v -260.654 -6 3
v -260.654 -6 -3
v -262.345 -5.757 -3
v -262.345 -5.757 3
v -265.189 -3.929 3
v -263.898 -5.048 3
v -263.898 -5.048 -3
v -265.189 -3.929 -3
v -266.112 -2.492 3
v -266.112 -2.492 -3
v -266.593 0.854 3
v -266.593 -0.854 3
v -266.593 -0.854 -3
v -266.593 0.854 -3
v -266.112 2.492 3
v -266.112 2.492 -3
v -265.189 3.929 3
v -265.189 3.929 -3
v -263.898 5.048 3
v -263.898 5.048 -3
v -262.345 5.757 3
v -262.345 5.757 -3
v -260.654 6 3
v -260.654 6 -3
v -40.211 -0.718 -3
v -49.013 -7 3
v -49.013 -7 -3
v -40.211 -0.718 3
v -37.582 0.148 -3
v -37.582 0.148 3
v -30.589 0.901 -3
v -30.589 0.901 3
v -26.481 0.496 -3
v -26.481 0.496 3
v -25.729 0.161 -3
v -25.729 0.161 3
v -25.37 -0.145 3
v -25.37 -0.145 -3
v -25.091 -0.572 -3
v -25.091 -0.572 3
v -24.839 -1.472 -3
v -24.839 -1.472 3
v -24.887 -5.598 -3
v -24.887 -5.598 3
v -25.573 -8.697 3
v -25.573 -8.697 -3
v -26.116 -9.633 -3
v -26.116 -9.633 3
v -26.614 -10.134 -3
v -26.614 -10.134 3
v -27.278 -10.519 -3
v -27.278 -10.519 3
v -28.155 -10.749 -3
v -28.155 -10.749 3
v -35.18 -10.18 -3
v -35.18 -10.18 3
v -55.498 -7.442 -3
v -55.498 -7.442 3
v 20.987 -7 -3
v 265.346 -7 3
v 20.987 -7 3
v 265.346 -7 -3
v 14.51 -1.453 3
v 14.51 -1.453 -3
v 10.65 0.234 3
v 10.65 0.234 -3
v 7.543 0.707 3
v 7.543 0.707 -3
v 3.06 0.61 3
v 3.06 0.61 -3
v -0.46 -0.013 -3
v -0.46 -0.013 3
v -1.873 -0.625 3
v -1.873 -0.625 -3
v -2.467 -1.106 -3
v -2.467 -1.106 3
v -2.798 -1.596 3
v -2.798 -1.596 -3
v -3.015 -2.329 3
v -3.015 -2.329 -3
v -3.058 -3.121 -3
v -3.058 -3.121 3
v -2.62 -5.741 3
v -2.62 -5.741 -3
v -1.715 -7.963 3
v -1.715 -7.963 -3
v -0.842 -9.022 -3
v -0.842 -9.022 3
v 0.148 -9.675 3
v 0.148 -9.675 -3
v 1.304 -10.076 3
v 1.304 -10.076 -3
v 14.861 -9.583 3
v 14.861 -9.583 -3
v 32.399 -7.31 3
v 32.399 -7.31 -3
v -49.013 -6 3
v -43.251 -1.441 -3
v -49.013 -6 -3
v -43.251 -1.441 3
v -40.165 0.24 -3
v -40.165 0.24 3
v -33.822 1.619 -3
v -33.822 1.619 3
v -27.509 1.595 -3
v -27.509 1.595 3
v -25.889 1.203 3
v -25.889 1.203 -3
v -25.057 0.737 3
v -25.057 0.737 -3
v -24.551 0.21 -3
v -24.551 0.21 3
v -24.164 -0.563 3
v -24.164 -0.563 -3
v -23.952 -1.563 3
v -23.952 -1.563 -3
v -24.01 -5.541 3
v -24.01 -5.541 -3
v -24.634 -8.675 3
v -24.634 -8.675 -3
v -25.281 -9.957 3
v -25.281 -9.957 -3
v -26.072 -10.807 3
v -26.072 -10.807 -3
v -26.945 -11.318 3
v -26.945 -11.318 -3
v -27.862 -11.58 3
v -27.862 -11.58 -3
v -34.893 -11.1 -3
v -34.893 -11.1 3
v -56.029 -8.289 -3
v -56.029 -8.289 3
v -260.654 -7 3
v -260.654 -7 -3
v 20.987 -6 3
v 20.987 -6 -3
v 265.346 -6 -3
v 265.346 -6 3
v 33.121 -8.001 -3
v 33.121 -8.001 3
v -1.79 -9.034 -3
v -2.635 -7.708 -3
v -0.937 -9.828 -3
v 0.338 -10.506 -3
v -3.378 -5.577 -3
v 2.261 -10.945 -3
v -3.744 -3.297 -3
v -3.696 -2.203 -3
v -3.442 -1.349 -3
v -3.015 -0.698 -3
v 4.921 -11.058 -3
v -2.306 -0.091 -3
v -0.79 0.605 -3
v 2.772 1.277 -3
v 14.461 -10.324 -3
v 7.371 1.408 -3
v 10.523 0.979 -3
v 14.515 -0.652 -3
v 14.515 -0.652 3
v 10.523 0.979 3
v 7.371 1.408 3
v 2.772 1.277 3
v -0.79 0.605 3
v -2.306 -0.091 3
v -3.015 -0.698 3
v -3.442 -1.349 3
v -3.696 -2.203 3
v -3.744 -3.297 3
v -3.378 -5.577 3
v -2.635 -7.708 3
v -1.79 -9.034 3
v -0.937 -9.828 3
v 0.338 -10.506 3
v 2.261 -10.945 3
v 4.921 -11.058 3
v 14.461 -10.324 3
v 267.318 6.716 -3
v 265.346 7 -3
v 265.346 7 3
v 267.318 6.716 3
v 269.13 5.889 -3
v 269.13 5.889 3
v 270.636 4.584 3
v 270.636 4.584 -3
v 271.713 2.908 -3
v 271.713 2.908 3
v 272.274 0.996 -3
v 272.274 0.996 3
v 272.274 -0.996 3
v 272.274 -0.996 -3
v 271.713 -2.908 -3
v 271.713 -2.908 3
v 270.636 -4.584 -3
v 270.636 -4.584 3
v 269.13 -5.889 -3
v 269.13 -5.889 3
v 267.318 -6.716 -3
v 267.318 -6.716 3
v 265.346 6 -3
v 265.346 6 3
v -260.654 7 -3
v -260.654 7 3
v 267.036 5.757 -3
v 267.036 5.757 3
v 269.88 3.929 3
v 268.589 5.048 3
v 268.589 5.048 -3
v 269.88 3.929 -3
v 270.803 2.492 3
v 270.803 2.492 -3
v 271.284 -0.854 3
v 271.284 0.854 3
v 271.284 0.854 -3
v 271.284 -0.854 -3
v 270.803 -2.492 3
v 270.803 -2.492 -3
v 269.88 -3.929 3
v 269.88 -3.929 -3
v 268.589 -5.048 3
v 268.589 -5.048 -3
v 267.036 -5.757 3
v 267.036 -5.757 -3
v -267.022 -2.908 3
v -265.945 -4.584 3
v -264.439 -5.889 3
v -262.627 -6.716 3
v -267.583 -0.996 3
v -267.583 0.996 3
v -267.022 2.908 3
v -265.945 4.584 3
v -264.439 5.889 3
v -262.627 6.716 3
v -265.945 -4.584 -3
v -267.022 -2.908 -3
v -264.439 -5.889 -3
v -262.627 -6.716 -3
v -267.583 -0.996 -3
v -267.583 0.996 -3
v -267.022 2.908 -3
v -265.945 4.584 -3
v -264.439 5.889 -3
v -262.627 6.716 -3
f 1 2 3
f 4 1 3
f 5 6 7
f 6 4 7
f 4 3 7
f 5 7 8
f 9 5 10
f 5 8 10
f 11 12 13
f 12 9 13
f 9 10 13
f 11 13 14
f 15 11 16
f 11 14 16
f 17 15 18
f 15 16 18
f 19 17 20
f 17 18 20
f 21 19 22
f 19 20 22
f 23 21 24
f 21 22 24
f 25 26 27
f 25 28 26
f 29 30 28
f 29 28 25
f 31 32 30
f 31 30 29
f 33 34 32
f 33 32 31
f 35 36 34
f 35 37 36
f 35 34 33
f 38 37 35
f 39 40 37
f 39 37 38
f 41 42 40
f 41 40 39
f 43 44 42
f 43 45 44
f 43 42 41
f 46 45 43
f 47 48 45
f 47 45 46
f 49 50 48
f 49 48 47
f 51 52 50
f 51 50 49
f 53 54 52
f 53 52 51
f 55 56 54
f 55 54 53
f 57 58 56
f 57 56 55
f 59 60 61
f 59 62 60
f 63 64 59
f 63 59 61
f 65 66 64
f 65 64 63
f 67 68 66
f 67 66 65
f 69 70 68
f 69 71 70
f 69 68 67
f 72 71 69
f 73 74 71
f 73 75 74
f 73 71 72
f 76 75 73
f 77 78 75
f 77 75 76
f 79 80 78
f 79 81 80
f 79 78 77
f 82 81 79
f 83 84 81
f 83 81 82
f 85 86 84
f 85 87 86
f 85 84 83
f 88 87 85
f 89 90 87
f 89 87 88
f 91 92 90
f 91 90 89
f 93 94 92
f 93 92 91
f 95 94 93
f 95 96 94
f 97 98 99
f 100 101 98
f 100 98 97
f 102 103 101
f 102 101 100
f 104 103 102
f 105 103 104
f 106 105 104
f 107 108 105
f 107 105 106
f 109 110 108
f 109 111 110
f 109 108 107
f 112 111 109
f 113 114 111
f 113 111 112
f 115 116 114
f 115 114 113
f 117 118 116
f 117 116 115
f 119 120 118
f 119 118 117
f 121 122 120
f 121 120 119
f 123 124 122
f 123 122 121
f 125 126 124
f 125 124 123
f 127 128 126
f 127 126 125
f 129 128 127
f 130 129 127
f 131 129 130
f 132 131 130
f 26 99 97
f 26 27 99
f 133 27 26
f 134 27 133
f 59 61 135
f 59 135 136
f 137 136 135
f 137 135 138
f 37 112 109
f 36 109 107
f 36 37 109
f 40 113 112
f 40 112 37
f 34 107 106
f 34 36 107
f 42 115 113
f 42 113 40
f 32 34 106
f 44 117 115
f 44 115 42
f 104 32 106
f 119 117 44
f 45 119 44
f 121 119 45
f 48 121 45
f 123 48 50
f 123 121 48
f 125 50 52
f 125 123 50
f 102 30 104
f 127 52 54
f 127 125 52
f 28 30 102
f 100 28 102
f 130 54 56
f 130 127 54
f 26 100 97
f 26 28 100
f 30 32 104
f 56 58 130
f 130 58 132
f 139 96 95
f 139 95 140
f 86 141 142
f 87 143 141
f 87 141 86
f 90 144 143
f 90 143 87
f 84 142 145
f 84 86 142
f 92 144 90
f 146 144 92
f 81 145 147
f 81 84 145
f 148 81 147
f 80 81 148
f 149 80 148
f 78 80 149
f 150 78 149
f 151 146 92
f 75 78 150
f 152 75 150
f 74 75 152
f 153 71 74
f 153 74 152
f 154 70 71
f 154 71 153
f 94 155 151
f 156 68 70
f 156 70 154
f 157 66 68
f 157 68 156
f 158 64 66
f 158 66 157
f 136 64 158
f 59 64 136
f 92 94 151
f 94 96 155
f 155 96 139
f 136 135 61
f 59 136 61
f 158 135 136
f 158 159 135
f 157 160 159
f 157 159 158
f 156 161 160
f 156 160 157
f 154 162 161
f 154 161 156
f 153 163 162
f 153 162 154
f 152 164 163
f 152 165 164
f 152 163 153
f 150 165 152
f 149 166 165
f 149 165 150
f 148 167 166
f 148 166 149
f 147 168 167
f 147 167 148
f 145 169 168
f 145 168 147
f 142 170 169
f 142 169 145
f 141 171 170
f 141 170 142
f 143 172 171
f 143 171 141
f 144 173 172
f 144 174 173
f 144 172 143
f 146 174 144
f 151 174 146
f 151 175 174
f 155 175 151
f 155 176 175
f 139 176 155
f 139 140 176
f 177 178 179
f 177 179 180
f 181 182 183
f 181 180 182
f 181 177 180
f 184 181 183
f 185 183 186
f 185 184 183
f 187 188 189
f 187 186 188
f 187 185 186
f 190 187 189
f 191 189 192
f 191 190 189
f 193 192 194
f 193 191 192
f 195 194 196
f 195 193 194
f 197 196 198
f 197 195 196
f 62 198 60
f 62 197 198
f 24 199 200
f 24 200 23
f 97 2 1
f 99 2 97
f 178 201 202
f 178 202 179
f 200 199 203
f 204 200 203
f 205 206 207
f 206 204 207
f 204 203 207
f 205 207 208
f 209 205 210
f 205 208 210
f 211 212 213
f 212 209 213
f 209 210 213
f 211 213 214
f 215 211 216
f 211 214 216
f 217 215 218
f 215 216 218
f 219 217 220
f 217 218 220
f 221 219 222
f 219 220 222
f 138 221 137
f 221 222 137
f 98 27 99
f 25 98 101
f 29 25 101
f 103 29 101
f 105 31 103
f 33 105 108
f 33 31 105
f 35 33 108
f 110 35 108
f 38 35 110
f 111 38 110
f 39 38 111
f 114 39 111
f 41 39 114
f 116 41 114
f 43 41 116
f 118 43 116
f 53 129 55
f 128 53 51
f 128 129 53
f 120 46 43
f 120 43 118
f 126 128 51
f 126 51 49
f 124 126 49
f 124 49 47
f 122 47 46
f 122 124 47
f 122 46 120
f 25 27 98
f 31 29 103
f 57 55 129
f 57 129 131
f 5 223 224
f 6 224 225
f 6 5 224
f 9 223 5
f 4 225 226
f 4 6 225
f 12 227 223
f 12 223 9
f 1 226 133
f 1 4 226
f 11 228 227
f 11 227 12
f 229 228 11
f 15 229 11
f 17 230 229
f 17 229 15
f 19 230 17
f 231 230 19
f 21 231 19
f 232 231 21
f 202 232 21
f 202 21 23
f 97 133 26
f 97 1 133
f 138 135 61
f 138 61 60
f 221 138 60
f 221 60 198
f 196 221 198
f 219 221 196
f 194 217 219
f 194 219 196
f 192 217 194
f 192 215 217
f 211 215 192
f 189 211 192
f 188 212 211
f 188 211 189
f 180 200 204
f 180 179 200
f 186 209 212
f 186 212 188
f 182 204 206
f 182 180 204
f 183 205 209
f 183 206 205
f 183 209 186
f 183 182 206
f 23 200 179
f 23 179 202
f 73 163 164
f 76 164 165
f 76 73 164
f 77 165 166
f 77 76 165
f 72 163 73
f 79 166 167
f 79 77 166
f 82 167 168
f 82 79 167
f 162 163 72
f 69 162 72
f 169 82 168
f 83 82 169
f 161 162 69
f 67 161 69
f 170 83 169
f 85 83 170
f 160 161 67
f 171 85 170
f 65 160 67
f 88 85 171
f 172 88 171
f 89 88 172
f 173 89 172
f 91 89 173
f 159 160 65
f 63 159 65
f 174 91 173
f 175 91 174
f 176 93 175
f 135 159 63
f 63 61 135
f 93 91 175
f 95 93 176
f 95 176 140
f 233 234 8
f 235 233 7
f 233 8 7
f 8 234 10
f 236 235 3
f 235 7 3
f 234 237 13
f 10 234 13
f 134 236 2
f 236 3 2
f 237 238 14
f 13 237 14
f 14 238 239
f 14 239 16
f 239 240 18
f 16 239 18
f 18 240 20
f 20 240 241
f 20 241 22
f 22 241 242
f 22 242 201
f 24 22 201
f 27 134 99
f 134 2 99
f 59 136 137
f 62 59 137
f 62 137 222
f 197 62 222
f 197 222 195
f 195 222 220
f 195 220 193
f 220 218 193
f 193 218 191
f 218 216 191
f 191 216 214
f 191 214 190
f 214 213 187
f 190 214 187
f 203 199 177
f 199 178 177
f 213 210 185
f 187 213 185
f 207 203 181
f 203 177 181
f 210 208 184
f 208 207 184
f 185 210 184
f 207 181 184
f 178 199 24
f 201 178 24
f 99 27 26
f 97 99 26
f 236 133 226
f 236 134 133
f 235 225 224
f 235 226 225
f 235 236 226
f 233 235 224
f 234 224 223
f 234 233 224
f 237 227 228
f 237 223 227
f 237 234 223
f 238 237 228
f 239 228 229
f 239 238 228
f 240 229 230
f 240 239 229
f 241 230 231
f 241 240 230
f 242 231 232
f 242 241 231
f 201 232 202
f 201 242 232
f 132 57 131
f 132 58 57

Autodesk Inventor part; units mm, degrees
ref_plane "YZ Plane" through (0, 0, 0) normal (1, 0, 0) x (0, 1, 0)
ref_plane "XZ Plane" through (0, 0, 0) normal (0, 1, 0) x (-1, 0, 0)
ref_plane "XY Plane" through (0, 0, 0) normal (0, 0, 1) x (1, 0, 0)
sketch "Sketch1" plane through (0, 0, 0) normal (0, 0, 1) x (1, 0, 0)
  line L0 (-260.6545, 0) -> (265.3455, 0) construction
  line L1 (-260.6545, -6) -> (265.3455, -6)
  line L2 (265.3455, 6) -> (-260.6545, 6)
  arc A0 (-260.6545, 6) -> (-260.6545, -6) centre (-260.6545, 0) ccw
  arc A1 (265.3455, -6) -> (265.3455, 6) centre (265.3455, 0) ccw
  line L3 (-260.6545, 7) -> (265.3455, 7)
  arc A2 (265.3455, -7) -> (265.3455, 7) centre (265.3455, 0) ccw
  line L4 (265.3455, -7) -> (-260.6545, -7)
  arc A3 (-260.6545, 7) -> (-260.6545, -7) centre (-260.6545, 0) ccw
  point P0 (0, 0)
  point P1 (2.3455, 0)
  dimension "d0" = 526
  dimension "d1" = 12
  dimension "d2" = 1
extrude "Extrusion1" add sketch "Sketch1" along normal mid plane 6
sketch "Sketch7" plane through (-260.6545, -7, 3) normal (0, -1, 0) x (1, 0, 0)
  line L0 (221.6418, 58.3771) -> (221.6418, -71.6229) projected
  line L1 (409.1418, -121.6229) -> (409.1418, 108.3771) projected
  line L2 (211.6418, 0) -> (281.6418, 0)
  line L3 (281.6418, 0) -> (281.6418, -6)
  line L4 (281.6418, -6) -> (211.6418, -6)
  line L5 (211.6418, -6) -> (211.6418, 0)
  line L6 (0, 0) -> (526, 0) projected
  line L7 (526, -6) -> (0, -6) projected
  line L8 (271.6418, -71.6229) -> (271.6418, 58.3771) projected
  point P0 (260.6545, -3)
  dimension "d11" = 10
  dimension "d17" = 10
extrude "Extrusion3" cut sketch "Sketch7" against normal blind 10 contours L2 L8 L4 L0 | L0 L4 L5 L2 | L2 L3 L4 L8
sketch "Sketch8" plane through (0, 0, 0) normal (0, 0, 1) x (1, 0, 0)
  line L0 (-39.0127, -8.8612) -> (-39.0127, -0.8612) projected
  line L1 (-29.0127, -8.8612) -> (-29.0127, -0.8612) projected
  line L2 (-49.0127, -6) -> (-49.0127, -7) projected
  line L3 (-49.0127, -7) -> (-49.0127, -6) projected
  line L4 (-49.0127, -6.5) -> (-46.6485, -5.141) construction
  line L5 (-46.6485, -5.141) -> (-43.2177, -1.1048) construction
  line L6 (-43.2177, -1.1048) -> (-37.7352, 1.2833) construction
  line L7 (-37.7352, 1.2833) -> (-27.9473, 1.5524) construction
  line L8 (-27.9473, 1.5524) -> (-24.2474, 0.6779) construction
  line L9 (-24.2474, 0.6779) -> (-24.2474, -3.0893) construction
  line L10 (-24.2474, -3.0893) -> (-24.5501, -9.0427) construction
  line L11 (-24.5501, -9.0427) -> (-26.9382, -11.4981) construction
  line L12 (-26.9382, -11.4981) -> (-30.5372, -11.2963) construction
  line L13 (-30.5372, -11.2963) -> (-37.8697, -10.3545) construction
  line L14 (-37.8697, -10.3545) -> (-48.6666, -8.1346) construction
  line L15 (-48.6666, -8.1346) -> (-55.7637, -7.8655) construction
  spline S0 degree 4 poles (-49.0127, -6.5) (-46.6485, -5.141) (-43.2177, -1.1048) (-37.7352, 1.2833) (-27.9473, 1.5524) (-24.2474, 0.6779) (-24.2474, -3.0893) (-24.5501, -9.0427) (-26.9382, -11.4981) (-30.5372, -11.2963) (-37.8697, -10.3545) (-48.6666, -8.1346) (-55.7637, -7.8655) knots 1 1 1 1 1 2 3 4 5 6 7 8 9 10 10 10 10 10
  point P0 (0, 0)
sketch "Sketch9" plane through (-49.0127, -7, 3) normal (1, 0, 0) x (0, 0, -1)
  line L0 (0, 1) -> (6, 1) projected
  line L1 (0, 0) -> (0, 1) projected
  line L2 (6, 0) -> (0, 0) projected
  line L3 (6, 1) -> (6, 0) projected
  point P0 (3, 7)
sweep "Sweep3" add profiles "Sketch9" path "Sketch8" separate body path curves S0
sketch "Sketch10" plane through (0, 0, 0) normal (0, 0, 1) x (1, 0, 0)
  line L0 (10.9873, -8.8612) -> (10.9873, -0.8612) projected
  line L1 (0.9873, -8.8612) -> (0.9873, -0.8612) projected
  line L2 (20.9873, -7) -> (20.9873, -6) projected
  line L3 (20.9873, -6) -> (20.9873, -7) projected
  line L4 (20.9873, -6.5) -> (14.1955, 0.6024) construction
  line L5 (14.1955, 0.6024) -> (7.3246, 1.5273) construction
  line L6 (7.3246, 1.5273) -> (-4.1709, 0.9988) construction
  line L7 (-4.1709, 0.9988) -> (-3.5102, -3.6259) construction
  line L8 (-3.5102, -3.6259) -> (-2.1228, -10.8931) construction
  line L9 (-2.1228, -10.8931) -> (5.3427, -10.8931) construction
  line L10 (5.3427, -10.8931) -> (15.5829, -9.9682) construction
  line L11 (15.5829, -9.9682) -> (23.0484, -8.8612) construction
  line L12 (23.0484, -8.8612) -> (30.3157, -7.6559) construction
  line L13 (30.3157, -7.6559) -> (32.7601, -7.6559) construction
  spline S0 degree 4 poles (20.9873, -6.5) (14.1955, 0.6024) (7.3246, 1.5273) (-4.1709, 0.9988) (-3.5102, -3.6259) (-2.1228, -10.8931) (5.3427, -10.8931) (15.5829, -9.9682) (23.0484, -8.8612) (30.3157, -7.6559) (32.7601, -7.6559) knots 1 1 1 1 1 2 3 4 5 6 7 8 8 8 8 8
  point P0 (0, 0)
sketch "Sketch11" plane through (20.9873, -7, -3) normal (-1, 0, 0) x (0, 0, 1)
  line L0 (0, 1) -> (6, 1) projected
  line L1 (0, 0) -> (0, 1) projected
  line L2 (6, 0) -> (0, 0) projected
  line L3 (6, 1) -> (6, 0) projected
  point P0 (3, 7)
sweep "Sweep4" add profiles "Sketch11" path "Sketch10" separate body path curves S0
equation "\"d17\" = d11"
properties part number "0005-10-1016 curea Y"
